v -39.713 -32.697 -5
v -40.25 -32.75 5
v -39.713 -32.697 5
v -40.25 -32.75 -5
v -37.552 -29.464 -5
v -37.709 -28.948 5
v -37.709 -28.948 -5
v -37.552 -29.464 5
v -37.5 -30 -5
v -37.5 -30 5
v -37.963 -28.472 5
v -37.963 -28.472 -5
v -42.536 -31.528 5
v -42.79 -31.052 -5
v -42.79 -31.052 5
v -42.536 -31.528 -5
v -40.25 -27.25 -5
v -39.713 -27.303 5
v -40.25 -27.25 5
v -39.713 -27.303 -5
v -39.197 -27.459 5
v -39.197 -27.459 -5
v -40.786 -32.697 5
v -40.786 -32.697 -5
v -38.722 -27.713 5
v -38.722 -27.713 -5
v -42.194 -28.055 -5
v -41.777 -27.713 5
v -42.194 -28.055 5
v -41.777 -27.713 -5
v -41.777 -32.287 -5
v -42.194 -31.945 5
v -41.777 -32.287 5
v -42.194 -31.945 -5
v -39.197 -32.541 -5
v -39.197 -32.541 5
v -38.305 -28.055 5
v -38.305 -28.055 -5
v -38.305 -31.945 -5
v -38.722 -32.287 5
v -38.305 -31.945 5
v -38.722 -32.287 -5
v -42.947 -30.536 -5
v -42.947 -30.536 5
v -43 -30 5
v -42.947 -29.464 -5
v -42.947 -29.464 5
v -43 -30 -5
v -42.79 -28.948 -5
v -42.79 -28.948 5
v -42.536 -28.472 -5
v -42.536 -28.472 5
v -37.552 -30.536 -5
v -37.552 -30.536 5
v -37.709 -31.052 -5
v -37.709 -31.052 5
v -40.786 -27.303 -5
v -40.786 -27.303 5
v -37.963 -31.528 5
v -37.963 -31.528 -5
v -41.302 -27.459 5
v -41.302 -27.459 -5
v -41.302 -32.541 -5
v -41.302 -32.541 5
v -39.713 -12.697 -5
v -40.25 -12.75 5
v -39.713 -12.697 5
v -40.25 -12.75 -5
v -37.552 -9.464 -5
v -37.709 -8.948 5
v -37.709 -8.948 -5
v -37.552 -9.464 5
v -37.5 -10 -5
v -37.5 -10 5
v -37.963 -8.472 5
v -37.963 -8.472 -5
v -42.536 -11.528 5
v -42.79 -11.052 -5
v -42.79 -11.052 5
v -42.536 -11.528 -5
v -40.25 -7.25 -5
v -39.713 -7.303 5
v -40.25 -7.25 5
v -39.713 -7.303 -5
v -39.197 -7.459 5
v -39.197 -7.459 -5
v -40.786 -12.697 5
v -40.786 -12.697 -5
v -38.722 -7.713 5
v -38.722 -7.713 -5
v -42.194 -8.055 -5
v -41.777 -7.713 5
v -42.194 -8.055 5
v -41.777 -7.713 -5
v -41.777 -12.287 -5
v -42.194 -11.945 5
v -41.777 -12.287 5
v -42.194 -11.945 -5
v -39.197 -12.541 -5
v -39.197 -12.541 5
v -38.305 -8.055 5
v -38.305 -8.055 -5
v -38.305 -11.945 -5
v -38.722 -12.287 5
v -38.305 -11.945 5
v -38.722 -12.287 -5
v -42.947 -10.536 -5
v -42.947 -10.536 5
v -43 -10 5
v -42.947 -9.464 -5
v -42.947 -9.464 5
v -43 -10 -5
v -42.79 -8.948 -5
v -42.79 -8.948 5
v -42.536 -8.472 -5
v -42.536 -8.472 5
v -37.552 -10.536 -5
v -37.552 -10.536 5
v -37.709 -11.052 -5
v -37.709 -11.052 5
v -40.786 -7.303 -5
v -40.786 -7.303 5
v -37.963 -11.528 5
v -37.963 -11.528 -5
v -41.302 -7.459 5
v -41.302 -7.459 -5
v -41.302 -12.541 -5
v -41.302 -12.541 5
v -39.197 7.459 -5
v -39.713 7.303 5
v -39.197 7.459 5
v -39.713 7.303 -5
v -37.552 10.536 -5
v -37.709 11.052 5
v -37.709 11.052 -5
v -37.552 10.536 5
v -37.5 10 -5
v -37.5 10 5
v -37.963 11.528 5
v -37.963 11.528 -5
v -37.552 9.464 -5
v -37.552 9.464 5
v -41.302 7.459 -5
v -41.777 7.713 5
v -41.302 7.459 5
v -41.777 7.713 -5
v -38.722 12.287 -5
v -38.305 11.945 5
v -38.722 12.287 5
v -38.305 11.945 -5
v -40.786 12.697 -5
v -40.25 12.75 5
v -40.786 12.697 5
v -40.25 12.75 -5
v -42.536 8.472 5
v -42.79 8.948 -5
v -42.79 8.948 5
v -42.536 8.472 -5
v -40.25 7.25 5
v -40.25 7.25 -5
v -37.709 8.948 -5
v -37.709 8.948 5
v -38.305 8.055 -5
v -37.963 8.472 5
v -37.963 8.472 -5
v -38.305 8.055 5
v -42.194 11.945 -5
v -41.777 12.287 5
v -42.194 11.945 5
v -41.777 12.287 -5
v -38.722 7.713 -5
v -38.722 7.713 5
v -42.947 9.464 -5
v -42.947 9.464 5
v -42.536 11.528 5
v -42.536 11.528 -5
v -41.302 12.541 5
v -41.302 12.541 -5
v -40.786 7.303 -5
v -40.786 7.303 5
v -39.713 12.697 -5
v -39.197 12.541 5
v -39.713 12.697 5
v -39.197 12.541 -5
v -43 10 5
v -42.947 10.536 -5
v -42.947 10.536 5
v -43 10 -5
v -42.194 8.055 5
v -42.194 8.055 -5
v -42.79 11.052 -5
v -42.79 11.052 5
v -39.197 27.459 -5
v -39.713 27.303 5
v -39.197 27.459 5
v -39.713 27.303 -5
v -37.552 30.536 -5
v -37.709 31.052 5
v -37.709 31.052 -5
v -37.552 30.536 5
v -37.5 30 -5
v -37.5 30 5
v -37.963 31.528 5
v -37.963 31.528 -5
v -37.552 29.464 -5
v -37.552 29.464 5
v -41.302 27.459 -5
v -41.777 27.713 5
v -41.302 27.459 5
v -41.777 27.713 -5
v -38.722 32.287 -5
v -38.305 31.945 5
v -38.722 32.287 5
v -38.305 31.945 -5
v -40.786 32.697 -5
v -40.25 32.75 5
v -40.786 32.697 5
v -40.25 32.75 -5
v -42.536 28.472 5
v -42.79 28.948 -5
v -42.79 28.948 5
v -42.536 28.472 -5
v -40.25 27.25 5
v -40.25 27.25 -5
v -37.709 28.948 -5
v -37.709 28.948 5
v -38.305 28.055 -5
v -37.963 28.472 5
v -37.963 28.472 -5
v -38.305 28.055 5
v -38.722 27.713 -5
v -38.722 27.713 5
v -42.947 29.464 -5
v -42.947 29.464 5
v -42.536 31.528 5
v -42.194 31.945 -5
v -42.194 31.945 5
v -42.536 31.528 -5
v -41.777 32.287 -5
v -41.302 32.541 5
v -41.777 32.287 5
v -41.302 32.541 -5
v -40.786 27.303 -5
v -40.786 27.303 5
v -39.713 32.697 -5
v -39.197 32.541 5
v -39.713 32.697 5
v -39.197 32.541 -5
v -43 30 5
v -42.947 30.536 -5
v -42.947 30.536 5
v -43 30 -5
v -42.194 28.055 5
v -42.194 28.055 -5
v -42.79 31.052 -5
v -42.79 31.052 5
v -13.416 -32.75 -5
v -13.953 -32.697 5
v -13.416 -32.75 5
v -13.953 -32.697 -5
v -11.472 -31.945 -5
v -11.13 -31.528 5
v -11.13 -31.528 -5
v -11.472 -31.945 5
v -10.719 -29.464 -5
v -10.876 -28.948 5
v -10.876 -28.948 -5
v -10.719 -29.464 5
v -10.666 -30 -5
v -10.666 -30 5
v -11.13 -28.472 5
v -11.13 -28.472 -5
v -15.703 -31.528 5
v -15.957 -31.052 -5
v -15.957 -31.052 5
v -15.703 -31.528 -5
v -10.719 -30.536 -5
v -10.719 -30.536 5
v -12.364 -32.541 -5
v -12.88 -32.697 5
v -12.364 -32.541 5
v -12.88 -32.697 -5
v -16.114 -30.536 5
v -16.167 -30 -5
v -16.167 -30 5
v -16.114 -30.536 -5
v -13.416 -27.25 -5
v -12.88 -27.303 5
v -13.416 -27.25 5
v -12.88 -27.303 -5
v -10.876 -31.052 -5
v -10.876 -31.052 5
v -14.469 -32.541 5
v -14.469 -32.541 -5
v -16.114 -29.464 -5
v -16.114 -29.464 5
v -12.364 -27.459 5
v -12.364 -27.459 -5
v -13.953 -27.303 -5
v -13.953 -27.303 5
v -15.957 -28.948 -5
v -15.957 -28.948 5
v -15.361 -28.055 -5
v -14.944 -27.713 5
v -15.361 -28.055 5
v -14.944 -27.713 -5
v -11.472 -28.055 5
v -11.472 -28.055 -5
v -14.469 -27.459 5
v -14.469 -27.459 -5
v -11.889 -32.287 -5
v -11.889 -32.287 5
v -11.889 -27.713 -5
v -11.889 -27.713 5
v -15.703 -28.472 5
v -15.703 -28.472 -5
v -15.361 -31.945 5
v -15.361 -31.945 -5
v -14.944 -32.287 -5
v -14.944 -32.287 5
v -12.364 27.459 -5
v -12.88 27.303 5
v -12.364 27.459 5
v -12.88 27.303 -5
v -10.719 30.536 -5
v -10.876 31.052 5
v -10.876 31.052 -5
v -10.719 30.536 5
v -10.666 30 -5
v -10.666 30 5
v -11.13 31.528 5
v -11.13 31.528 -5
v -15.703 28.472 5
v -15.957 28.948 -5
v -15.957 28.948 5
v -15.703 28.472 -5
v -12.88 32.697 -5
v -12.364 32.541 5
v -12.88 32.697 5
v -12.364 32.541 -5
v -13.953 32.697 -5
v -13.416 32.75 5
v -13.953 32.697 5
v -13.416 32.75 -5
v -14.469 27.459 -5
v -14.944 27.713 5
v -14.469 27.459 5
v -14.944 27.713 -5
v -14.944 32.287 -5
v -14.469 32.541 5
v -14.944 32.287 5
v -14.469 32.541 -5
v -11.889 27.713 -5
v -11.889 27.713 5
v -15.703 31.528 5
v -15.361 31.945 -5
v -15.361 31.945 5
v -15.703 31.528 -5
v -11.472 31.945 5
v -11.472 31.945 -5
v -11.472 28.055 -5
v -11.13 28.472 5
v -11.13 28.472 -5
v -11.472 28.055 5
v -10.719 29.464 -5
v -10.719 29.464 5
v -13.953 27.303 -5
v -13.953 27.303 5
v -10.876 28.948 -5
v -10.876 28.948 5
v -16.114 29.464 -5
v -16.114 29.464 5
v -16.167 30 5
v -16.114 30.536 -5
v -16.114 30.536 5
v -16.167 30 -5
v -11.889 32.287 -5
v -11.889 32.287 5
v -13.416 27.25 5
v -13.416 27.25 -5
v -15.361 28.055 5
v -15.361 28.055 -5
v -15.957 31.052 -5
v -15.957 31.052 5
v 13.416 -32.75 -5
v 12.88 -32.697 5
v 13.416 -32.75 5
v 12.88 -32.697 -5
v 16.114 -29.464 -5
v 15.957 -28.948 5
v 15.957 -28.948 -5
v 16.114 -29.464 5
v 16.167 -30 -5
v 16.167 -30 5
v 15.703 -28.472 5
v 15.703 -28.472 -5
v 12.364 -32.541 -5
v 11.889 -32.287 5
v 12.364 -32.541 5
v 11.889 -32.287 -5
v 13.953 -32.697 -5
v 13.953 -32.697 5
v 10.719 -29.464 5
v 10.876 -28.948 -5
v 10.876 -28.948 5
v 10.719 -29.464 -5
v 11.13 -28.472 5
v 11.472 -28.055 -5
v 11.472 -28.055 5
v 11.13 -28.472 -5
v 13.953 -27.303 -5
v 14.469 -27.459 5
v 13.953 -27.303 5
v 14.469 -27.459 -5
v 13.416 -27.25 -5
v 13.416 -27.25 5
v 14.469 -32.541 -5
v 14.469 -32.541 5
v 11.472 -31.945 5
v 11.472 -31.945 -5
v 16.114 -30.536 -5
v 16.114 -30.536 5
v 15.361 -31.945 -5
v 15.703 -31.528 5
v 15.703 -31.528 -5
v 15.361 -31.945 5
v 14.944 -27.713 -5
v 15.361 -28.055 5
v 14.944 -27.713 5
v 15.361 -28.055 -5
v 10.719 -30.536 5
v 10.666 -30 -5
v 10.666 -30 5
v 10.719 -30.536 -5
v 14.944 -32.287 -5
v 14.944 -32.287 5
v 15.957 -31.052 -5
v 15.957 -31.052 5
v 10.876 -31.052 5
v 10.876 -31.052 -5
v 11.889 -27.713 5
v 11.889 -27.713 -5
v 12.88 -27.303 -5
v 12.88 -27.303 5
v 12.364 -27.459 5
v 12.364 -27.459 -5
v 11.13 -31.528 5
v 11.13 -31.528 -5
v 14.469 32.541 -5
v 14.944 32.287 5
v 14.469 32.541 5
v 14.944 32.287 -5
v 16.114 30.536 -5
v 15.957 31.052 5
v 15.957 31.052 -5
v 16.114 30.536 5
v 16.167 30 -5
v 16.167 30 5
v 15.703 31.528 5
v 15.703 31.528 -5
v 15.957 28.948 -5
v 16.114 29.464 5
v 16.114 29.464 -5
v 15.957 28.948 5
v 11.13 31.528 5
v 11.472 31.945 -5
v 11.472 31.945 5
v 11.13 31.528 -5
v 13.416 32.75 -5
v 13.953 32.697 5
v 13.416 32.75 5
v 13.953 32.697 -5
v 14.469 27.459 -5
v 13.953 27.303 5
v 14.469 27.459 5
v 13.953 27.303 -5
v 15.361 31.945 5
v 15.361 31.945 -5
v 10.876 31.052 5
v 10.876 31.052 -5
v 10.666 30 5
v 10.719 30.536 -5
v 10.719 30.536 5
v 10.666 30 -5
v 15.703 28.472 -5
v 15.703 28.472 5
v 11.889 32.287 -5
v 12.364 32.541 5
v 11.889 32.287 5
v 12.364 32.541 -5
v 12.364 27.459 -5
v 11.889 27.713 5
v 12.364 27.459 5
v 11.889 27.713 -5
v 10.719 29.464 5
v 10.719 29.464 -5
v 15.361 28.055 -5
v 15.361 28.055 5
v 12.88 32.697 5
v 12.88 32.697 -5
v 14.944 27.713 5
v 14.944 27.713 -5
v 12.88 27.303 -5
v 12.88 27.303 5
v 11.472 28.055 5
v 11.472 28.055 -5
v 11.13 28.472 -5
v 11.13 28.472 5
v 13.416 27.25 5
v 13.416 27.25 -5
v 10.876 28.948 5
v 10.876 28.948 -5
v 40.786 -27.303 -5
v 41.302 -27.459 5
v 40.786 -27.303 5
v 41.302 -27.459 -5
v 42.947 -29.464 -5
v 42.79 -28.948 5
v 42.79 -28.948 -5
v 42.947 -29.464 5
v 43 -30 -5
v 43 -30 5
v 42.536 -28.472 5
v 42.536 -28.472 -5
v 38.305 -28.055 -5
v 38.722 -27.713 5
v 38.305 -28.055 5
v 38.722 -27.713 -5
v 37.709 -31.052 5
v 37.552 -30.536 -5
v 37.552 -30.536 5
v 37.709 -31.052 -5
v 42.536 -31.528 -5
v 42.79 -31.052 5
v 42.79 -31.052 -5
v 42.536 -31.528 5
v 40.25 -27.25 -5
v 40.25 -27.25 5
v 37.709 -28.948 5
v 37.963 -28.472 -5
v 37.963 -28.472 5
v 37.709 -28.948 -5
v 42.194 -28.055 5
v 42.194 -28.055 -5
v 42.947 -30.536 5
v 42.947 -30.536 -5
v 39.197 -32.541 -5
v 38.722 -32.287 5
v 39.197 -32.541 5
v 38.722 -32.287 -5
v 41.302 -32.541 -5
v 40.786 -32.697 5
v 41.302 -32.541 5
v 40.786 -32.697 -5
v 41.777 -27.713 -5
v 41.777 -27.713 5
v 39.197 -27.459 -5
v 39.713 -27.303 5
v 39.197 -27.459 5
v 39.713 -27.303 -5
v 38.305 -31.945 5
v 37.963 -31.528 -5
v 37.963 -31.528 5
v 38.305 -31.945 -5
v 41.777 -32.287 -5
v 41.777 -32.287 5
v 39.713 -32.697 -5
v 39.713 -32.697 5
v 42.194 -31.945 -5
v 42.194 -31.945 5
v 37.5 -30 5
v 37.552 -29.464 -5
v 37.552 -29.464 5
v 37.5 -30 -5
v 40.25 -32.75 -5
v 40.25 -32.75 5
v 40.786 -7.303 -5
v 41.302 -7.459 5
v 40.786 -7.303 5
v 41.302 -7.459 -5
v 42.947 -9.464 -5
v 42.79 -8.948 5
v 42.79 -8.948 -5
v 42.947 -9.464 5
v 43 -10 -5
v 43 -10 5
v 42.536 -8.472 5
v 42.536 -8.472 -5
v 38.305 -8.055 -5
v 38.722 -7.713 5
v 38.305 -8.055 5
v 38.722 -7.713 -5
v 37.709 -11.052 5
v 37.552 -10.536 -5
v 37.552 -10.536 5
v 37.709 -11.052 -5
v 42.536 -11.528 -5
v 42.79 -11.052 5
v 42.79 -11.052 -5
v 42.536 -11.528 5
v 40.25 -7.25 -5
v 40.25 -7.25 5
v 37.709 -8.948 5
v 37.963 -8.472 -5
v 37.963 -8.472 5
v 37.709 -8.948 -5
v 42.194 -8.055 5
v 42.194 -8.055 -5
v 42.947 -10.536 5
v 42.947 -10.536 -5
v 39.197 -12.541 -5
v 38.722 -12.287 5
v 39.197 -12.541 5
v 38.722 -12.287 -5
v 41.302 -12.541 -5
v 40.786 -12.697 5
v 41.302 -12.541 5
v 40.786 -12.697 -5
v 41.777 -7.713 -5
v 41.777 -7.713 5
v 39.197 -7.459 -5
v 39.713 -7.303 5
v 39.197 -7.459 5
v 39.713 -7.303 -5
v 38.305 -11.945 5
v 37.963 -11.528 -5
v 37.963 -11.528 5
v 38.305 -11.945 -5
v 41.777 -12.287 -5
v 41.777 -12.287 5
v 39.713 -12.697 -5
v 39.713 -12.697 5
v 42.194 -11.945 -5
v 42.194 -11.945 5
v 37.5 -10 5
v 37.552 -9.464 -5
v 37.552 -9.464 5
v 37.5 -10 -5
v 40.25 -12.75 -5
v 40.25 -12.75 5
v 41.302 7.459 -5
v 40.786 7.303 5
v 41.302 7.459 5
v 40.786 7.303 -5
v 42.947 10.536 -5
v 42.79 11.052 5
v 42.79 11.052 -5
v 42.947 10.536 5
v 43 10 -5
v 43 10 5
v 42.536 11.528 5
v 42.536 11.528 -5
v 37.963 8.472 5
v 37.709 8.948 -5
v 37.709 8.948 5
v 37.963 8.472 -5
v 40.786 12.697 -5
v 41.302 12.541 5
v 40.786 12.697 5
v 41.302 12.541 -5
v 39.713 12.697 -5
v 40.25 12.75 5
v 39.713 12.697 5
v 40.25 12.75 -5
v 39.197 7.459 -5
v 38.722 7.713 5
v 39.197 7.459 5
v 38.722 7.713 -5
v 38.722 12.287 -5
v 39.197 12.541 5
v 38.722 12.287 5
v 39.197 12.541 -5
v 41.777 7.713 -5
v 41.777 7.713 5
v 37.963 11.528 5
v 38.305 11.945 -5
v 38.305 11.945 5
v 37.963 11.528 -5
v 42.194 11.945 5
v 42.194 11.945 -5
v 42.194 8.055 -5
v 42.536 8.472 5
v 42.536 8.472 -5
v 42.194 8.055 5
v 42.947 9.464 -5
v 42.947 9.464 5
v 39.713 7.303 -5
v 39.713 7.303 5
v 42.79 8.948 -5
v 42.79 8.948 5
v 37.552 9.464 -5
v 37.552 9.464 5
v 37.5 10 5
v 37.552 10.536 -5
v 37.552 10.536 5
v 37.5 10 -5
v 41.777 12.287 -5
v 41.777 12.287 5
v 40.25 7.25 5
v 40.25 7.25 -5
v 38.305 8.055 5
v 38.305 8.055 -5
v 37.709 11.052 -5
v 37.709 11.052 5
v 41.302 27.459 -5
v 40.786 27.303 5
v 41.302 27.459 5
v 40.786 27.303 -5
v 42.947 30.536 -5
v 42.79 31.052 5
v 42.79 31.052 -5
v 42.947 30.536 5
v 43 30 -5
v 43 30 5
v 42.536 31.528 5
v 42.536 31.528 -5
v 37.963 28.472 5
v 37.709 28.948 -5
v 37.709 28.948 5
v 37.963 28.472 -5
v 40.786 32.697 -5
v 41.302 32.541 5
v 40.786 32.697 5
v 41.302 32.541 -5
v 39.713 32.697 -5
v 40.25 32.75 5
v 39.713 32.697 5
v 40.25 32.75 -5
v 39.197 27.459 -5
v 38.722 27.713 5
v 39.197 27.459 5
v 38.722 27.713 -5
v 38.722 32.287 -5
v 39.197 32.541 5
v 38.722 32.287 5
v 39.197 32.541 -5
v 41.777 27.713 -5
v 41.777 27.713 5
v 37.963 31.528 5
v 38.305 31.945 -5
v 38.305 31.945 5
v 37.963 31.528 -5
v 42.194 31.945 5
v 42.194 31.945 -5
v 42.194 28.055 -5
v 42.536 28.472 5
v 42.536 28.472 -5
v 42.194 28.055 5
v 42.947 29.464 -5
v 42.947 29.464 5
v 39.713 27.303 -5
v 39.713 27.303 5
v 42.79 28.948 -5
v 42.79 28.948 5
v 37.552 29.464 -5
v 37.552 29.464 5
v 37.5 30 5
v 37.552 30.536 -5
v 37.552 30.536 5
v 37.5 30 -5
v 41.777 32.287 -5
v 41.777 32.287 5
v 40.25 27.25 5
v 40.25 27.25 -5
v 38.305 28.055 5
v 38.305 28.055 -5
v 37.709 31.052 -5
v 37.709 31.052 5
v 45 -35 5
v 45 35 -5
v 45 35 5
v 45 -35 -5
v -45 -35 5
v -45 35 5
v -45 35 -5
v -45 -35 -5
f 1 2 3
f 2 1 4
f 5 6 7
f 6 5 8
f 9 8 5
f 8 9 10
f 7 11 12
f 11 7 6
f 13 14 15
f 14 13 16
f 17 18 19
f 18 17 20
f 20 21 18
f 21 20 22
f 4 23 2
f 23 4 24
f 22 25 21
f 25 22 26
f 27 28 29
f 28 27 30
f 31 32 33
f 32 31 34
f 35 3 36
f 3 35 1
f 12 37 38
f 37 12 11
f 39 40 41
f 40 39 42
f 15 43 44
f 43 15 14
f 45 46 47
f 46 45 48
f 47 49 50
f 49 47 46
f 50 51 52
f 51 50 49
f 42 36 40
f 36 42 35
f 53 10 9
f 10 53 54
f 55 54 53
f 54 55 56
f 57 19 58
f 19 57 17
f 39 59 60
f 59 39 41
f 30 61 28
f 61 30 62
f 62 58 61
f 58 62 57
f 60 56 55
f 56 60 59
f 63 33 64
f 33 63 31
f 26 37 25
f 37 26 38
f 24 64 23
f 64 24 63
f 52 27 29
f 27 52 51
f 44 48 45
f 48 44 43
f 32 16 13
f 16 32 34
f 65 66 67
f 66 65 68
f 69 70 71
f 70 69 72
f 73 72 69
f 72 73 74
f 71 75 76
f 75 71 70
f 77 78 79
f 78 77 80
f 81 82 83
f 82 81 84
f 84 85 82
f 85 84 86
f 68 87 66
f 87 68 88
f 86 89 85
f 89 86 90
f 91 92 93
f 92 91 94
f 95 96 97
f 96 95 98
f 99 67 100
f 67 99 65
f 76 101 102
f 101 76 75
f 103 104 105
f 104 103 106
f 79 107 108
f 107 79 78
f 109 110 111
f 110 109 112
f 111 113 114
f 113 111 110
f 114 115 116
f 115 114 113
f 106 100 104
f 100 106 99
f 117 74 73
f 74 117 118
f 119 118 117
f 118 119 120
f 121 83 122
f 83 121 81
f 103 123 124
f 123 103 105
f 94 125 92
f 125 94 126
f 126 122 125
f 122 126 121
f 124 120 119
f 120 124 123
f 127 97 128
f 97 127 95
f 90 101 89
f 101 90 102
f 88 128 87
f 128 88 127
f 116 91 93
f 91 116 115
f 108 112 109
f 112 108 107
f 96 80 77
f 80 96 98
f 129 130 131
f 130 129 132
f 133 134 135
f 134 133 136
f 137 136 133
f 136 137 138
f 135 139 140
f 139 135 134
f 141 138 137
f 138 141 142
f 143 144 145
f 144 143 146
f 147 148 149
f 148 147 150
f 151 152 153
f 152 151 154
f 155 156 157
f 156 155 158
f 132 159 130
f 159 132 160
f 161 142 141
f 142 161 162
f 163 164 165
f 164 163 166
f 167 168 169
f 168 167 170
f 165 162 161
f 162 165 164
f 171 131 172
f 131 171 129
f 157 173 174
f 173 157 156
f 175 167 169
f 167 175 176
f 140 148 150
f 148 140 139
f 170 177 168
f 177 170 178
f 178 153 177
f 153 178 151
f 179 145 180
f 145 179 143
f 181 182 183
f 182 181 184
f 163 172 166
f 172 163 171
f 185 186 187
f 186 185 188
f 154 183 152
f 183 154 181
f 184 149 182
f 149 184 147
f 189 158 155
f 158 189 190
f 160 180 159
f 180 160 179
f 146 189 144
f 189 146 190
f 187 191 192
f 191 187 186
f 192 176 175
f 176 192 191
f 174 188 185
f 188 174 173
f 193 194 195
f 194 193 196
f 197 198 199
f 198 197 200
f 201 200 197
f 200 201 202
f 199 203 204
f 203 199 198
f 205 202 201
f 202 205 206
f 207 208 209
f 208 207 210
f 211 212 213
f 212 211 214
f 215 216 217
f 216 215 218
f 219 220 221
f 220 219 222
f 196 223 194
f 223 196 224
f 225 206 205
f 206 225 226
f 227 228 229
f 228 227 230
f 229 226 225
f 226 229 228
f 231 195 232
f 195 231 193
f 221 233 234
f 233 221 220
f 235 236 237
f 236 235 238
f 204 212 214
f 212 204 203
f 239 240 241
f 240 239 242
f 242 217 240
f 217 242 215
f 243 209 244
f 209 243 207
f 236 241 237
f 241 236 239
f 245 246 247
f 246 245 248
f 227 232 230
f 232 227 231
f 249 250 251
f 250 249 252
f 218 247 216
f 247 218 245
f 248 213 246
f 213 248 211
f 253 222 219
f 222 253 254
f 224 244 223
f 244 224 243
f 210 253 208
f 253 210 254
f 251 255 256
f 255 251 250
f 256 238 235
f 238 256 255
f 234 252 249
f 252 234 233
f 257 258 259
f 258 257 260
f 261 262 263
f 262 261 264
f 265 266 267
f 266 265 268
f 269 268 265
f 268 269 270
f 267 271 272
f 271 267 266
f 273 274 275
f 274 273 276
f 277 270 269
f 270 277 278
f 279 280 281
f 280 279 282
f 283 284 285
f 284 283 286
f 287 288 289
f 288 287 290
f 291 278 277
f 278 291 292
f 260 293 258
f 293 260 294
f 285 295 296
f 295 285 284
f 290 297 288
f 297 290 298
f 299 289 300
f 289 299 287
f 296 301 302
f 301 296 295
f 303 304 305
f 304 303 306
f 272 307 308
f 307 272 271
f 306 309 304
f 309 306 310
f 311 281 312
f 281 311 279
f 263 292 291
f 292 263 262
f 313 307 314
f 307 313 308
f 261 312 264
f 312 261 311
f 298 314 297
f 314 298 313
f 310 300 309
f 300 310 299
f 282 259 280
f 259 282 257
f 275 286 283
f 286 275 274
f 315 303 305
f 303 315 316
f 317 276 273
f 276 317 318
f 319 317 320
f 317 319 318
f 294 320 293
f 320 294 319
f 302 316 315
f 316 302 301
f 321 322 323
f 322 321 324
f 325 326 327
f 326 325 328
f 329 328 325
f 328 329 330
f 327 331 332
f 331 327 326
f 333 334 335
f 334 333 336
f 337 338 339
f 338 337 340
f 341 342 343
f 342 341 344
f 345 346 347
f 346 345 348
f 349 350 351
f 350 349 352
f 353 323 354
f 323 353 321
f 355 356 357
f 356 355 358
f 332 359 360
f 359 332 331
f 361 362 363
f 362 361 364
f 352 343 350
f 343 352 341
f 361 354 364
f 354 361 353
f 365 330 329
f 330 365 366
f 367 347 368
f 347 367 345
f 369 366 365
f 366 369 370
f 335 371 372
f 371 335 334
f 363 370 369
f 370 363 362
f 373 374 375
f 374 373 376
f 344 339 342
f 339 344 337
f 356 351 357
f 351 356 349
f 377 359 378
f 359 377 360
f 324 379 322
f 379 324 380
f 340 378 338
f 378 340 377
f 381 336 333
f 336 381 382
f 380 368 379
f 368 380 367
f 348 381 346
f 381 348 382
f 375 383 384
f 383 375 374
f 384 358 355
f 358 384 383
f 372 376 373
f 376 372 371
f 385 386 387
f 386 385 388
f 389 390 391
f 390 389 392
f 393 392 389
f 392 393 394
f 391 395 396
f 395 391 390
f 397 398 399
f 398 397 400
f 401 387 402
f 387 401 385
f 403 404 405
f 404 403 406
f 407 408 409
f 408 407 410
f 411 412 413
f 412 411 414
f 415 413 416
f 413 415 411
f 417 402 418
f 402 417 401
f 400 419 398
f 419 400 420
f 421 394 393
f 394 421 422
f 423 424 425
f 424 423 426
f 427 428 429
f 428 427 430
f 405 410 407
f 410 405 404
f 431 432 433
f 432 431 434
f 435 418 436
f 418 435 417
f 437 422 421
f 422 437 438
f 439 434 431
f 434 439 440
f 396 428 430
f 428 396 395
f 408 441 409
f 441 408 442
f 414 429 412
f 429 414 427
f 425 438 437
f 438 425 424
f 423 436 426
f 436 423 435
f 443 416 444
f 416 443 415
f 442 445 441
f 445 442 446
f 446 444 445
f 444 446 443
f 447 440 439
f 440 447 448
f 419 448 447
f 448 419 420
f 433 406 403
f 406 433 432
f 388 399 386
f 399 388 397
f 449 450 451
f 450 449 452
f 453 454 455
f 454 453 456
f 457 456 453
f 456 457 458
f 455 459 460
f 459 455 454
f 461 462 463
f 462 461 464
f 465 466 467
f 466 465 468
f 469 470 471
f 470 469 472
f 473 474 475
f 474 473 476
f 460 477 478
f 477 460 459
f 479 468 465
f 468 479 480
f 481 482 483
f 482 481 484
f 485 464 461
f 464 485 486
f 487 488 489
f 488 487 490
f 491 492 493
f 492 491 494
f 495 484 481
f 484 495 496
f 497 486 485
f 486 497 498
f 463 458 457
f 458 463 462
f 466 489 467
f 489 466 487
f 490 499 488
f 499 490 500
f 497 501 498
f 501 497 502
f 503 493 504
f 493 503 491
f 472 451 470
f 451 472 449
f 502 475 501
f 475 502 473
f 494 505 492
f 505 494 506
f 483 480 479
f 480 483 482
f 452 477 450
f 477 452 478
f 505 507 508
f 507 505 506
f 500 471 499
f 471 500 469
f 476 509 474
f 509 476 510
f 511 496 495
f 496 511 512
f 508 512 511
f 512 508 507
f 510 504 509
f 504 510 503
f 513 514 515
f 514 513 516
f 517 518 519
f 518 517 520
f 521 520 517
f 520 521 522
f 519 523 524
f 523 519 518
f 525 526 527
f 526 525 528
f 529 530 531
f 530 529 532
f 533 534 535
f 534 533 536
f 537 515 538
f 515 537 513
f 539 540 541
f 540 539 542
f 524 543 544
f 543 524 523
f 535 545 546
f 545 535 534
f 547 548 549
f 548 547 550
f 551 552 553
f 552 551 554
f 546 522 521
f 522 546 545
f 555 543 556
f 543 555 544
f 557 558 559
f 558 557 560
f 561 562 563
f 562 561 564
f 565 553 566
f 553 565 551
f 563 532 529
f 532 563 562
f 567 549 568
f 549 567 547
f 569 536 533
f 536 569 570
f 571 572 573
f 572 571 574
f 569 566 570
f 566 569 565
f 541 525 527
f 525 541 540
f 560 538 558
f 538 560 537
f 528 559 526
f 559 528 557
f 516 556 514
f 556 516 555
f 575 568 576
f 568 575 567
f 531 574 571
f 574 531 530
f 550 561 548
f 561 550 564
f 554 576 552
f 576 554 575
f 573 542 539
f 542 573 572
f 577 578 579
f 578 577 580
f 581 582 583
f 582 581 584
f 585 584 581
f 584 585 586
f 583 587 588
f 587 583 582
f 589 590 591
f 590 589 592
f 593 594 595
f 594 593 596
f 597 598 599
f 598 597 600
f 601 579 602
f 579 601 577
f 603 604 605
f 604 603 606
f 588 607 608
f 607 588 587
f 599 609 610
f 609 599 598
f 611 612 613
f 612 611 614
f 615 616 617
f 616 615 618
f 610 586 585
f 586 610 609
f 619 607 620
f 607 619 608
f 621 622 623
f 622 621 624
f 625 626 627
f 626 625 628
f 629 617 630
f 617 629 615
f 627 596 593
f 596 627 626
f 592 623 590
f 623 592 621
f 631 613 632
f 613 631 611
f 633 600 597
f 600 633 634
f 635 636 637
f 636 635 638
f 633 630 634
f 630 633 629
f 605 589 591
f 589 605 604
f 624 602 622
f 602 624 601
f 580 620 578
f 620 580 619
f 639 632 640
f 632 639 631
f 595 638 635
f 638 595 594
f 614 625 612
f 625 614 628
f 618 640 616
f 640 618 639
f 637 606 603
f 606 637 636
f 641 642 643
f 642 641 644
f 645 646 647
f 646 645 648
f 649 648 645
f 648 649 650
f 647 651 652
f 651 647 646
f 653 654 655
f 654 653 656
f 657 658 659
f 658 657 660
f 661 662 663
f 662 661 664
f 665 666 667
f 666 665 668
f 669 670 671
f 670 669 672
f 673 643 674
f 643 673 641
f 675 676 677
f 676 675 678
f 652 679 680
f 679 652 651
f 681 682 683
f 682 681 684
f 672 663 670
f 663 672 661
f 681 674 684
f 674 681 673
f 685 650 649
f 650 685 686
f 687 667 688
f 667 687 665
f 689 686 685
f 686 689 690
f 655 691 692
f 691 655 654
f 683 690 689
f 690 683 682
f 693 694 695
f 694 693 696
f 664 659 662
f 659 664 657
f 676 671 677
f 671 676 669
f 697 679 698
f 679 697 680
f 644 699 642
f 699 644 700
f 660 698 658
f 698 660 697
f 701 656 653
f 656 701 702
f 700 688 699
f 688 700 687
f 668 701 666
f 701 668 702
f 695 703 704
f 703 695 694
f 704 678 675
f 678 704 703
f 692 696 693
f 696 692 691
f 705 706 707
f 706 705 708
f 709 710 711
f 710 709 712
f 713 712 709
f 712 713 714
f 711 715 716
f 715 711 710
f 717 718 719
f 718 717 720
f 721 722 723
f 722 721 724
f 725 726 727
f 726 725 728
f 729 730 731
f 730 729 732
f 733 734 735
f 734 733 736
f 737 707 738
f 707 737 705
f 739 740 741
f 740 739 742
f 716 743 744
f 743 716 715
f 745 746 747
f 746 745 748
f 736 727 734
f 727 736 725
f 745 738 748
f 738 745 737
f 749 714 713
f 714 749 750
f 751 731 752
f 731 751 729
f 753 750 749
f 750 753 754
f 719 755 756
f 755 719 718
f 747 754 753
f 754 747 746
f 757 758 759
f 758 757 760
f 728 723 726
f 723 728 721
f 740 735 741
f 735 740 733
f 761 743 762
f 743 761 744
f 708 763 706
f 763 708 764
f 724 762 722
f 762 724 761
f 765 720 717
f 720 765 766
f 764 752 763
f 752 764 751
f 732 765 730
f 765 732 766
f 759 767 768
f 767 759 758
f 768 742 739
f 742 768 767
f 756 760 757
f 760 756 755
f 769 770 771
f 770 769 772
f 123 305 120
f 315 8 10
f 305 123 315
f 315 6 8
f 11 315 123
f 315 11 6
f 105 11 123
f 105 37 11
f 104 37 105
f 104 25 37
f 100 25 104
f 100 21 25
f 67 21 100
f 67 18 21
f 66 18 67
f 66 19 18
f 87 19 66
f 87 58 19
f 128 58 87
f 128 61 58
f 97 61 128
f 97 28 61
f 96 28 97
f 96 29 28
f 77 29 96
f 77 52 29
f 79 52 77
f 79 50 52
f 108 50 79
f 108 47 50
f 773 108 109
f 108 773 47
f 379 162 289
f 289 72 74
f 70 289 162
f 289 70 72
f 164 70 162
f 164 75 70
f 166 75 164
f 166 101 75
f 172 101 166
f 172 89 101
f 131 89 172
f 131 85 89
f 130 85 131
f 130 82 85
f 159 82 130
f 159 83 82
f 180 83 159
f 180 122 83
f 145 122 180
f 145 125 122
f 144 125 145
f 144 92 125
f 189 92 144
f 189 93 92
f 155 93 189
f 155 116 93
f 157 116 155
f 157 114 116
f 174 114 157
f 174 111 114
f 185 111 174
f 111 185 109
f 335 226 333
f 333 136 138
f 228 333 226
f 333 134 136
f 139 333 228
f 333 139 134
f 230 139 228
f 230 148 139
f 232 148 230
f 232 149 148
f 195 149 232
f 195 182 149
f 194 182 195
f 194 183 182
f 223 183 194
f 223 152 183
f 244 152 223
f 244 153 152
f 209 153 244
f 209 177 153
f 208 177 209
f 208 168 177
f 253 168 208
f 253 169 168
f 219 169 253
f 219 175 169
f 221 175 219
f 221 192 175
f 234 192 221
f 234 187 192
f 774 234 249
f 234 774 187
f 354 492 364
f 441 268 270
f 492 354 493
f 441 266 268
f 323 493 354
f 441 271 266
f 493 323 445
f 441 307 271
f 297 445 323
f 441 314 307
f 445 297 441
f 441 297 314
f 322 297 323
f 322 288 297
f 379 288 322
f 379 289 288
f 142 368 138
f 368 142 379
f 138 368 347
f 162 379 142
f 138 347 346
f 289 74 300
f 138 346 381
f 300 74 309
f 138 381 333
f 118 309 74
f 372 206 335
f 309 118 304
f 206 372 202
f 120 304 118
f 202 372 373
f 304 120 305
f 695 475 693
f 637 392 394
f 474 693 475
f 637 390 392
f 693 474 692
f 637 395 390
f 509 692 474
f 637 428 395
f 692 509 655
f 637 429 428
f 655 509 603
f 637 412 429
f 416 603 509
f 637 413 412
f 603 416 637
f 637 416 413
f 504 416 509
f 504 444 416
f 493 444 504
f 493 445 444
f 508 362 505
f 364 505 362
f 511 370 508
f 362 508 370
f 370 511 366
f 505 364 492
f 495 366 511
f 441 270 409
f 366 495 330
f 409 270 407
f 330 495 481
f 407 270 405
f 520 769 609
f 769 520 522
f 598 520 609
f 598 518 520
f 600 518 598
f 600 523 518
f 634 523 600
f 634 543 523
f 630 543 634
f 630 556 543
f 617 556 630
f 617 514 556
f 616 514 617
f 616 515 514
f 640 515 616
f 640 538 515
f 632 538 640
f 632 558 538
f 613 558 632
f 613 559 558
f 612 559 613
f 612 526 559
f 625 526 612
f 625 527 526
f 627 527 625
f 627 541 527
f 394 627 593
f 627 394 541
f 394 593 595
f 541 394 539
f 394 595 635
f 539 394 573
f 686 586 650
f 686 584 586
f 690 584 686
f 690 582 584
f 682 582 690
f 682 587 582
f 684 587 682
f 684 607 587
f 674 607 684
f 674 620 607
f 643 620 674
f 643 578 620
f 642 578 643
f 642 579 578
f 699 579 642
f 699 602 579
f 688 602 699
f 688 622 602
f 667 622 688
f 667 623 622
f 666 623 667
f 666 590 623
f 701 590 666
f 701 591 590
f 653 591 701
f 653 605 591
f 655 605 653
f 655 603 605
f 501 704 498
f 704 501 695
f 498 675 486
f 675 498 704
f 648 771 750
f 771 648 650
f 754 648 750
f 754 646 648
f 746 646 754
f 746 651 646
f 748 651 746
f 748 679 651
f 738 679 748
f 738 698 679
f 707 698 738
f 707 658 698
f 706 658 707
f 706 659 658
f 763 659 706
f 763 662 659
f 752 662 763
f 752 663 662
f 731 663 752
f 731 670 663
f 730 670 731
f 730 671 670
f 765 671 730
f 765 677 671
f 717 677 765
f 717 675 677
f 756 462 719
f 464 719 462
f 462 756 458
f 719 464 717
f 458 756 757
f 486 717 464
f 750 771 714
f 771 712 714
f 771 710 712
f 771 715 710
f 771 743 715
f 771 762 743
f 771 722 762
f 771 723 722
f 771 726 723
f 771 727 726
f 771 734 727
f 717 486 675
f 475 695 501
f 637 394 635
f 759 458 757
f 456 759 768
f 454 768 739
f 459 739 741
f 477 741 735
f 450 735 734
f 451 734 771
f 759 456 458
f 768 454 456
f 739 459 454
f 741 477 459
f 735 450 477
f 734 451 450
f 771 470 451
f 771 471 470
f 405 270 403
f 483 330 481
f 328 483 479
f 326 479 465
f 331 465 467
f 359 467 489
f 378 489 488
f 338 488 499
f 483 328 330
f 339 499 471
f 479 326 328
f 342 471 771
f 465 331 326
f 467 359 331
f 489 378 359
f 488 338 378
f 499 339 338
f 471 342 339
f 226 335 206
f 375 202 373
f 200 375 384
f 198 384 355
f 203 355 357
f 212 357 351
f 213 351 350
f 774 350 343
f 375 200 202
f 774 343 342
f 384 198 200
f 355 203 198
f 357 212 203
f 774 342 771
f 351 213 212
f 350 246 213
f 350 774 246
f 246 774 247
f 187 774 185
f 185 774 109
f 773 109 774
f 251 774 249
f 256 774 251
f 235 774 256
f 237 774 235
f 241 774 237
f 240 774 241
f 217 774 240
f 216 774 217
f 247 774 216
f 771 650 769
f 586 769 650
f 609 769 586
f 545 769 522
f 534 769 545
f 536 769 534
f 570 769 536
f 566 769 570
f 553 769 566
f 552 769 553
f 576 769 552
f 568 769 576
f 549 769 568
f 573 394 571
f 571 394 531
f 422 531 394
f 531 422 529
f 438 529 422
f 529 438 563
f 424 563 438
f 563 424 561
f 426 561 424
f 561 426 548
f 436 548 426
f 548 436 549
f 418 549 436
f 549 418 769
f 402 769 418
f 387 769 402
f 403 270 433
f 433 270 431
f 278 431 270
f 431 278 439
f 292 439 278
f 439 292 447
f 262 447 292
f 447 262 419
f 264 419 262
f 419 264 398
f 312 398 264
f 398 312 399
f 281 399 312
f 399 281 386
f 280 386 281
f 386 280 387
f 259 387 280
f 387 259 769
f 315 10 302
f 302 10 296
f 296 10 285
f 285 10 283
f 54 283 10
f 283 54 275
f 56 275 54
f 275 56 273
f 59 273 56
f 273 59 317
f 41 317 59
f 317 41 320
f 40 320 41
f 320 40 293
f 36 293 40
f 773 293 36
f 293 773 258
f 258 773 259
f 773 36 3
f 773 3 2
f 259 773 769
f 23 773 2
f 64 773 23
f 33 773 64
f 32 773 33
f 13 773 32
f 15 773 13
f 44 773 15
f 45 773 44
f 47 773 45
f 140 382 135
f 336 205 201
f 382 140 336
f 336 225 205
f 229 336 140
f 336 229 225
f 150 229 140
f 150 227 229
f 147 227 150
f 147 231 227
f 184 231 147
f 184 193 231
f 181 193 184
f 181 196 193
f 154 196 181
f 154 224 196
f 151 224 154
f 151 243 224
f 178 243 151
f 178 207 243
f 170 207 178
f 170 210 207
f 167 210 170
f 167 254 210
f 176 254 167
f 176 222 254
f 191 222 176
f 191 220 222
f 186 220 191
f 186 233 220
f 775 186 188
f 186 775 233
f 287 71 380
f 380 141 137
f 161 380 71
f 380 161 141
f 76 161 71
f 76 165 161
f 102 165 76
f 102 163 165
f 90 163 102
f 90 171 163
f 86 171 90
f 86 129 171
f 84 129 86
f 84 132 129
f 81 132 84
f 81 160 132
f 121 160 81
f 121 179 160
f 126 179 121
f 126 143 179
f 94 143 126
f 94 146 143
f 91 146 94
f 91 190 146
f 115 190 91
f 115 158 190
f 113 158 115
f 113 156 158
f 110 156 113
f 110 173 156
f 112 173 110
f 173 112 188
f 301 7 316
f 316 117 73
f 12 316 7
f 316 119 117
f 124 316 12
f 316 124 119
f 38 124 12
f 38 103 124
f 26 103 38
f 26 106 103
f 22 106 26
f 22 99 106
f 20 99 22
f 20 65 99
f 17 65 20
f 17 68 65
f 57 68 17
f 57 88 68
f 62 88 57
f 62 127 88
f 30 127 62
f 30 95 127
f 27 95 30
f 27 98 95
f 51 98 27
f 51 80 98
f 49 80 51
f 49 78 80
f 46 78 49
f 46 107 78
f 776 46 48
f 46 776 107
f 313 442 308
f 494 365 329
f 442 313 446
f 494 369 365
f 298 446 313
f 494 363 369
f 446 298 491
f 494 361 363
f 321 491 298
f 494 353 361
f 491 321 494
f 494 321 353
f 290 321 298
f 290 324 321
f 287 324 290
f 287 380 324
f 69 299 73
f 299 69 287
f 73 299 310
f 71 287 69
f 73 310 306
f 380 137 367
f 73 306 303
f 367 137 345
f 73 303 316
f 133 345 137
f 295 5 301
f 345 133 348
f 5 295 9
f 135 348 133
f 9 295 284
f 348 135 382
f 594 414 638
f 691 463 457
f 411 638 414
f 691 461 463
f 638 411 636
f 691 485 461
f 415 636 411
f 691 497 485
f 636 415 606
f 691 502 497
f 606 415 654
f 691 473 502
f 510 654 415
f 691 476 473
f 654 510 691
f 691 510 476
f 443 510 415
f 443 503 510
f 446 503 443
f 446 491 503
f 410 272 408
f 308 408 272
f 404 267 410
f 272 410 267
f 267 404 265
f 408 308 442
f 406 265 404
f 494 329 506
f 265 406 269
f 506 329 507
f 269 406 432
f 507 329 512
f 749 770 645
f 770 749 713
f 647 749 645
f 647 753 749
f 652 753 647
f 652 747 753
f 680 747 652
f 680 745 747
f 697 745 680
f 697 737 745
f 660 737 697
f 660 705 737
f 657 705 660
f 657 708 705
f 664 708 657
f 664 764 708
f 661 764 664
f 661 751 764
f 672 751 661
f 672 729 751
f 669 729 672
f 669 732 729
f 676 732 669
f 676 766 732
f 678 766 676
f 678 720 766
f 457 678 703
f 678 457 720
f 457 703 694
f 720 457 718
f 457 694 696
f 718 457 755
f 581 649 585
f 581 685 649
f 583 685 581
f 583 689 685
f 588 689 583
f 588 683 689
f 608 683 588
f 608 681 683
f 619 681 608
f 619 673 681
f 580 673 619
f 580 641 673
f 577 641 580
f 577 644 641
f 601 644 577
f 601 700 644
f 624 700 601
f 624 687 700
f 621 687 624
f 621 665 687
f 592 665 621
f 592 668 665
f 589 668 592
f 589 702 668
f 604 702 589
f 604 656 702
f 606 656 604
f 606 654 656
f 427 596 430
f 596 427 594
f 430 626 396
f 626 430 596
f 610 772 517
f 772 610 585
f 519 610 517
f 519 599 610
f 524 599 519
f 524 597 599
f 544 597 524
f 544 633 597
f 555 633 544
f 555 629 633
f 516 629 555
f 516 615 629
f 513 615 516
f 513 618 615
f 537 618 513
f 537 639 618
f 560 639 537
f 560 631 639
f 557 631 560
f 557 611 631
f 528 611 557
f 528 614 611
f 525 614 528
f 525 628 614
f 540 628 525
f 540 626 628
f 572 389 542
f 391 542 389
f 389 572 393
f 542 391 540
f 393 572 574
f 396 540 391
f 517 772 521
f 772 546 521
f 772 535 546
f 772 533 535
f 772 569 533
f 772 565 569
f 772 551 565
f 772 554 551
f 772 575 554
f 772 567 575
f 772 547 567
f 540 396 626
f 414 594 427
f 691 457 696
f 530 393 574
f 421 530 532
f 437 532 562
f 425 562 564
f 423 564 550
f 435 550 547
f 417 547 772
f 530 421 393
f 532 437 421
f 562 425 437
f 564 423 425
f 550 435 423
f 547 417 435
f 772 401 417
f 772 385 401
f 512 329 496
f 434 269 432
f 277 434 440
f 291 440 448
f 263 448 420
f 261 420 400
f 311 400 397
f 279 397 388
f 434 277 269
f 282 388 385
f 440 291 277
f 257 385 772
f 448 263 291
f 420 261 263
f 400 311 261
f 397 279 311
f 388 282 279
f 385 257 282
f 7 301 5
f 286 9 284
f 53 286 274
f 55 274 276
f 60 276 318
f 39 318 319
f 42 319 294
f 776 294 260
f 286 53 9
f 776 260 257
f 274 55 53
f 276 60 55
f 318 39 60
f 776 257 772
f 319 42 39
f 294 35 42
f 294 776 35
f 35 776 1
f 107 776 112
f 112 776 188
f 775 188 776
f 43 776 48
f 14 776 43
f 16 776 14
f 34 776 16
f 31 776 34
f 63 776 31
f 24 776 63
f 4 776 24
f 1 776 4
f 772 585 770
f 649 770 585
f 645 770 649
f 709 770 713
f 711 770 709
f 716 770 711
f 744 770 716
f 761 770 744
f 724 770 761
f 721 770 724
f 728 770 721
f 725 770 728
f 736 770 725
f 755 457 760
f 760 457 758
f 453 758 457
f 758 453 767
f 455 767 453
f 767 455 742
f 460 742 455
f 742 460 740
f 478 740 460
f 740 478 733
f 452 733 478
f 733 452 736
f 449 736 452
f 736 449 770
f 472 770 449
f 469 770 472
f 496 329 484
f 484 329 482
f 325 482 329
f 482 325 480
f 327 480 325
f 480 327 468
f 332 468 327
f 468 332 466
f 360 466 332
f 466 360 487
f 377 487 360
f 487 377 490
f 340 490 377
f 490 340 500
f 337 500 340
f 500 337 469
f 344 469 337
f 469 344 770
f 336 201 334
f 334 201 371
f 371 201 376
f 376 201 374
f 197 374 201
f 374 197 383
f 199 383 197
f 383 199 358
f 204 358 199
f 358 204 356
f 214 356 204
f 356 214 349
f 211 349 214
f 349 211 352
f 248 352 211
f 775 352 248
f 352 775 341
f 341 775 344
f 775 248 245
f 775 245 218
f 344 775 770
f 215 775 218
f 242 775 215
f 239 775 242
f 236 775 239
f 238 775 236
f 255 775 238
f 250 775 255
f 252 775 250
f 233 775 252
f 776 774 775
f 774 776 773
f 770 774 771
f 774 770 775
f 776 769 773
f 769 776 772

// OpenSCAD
$fn = 32;

// ----------------------------------------------------------------------
// Perforated panel 90 x 70 x 10
// 4 x 4 Ø5.5 holes, frame layout
// ----------------------------------------------------------------------

// --- parameters (mm) ---
panel = [90, 70, 10];  // overall size (x, y, z)
seat_tol = 0.15;       // tolerance at the seating features
free_tol = 0.5;        // general tolerance on the free sizes
hole_d = 5.5;          // hole diameter
pitch_x = 26.833;      // hole pitch along X
pitch_y = 20;          // hole pitch along Y

// --- derived feature positions (mm) ---
margin = hole_d / 2 + 2;            // = 4.75   clearance from the panel edge
cols = floor((panel[0] - 2 * margin) / pitch_x) + 1;  // = 4   how many columns fit in X
rows = floor((panel[1] - 2 * margin) / pitch_y) + 1;  // = 4   how many rows fit in Y
span_x = (cols - 1) * pitch_x + 0;  // = 80.5   width of the field
span_y = (rows - 1) * pitch_y;      // = 60   height of the field
origin_x = -span_x / 2;             // = -40.25   X of the first hole
origin_y = -span_y / 2;             // = -30   Y of the first row
holes = 2 * cols + 2 * (rows - 2);  // = 12   holes around the frame
feature_centers = [
  [origin_x + 0 * pitch_x, origin_y + 0 * pitch_y],
  [origin_x + 0 * pitch_x, origin_y + 1 * pitch_y],
  [origin_x + 0 * pitch_x, origin_y + 2 * pitch_y],
  [origin_x + 0 * pitch_x, origin_y + 3 * pitch_y],
  [origin_x + 1 * pitch_x, origin_y + 0 * pitch_y],
  [origin_x + 1 * pitch_x, origin_y + 3 * pitch_y],
  [origin_x + 2 * pitch_x, origin_y + 0 * pitch_y],
  [origin_x + 2 * pitch_x, origin_y + 3 * pitch_y],
  [origin_x + 3 * pitch_x, origin_y + 0 * pitch_y],
  [origin_x + 3 * pitch_x, origin_y + 1 * pitch_y],
  [origin_x + 3 * pitch_x, origin_y + 2 * pitch_y],
  [origin_x + 3 * pitch_x, origin_y + 3 * pitch_y]
];   // hole centres, used verbatim by the cutter loop

// panel outline, every hole through
difference() {
  cube(panel, center = true);
  for (centre = feature_centers)
    translate([centre[0], centre[1], 0])
      cylinder(d = hole_d, h = panel[2] + 2, center = true);
}
